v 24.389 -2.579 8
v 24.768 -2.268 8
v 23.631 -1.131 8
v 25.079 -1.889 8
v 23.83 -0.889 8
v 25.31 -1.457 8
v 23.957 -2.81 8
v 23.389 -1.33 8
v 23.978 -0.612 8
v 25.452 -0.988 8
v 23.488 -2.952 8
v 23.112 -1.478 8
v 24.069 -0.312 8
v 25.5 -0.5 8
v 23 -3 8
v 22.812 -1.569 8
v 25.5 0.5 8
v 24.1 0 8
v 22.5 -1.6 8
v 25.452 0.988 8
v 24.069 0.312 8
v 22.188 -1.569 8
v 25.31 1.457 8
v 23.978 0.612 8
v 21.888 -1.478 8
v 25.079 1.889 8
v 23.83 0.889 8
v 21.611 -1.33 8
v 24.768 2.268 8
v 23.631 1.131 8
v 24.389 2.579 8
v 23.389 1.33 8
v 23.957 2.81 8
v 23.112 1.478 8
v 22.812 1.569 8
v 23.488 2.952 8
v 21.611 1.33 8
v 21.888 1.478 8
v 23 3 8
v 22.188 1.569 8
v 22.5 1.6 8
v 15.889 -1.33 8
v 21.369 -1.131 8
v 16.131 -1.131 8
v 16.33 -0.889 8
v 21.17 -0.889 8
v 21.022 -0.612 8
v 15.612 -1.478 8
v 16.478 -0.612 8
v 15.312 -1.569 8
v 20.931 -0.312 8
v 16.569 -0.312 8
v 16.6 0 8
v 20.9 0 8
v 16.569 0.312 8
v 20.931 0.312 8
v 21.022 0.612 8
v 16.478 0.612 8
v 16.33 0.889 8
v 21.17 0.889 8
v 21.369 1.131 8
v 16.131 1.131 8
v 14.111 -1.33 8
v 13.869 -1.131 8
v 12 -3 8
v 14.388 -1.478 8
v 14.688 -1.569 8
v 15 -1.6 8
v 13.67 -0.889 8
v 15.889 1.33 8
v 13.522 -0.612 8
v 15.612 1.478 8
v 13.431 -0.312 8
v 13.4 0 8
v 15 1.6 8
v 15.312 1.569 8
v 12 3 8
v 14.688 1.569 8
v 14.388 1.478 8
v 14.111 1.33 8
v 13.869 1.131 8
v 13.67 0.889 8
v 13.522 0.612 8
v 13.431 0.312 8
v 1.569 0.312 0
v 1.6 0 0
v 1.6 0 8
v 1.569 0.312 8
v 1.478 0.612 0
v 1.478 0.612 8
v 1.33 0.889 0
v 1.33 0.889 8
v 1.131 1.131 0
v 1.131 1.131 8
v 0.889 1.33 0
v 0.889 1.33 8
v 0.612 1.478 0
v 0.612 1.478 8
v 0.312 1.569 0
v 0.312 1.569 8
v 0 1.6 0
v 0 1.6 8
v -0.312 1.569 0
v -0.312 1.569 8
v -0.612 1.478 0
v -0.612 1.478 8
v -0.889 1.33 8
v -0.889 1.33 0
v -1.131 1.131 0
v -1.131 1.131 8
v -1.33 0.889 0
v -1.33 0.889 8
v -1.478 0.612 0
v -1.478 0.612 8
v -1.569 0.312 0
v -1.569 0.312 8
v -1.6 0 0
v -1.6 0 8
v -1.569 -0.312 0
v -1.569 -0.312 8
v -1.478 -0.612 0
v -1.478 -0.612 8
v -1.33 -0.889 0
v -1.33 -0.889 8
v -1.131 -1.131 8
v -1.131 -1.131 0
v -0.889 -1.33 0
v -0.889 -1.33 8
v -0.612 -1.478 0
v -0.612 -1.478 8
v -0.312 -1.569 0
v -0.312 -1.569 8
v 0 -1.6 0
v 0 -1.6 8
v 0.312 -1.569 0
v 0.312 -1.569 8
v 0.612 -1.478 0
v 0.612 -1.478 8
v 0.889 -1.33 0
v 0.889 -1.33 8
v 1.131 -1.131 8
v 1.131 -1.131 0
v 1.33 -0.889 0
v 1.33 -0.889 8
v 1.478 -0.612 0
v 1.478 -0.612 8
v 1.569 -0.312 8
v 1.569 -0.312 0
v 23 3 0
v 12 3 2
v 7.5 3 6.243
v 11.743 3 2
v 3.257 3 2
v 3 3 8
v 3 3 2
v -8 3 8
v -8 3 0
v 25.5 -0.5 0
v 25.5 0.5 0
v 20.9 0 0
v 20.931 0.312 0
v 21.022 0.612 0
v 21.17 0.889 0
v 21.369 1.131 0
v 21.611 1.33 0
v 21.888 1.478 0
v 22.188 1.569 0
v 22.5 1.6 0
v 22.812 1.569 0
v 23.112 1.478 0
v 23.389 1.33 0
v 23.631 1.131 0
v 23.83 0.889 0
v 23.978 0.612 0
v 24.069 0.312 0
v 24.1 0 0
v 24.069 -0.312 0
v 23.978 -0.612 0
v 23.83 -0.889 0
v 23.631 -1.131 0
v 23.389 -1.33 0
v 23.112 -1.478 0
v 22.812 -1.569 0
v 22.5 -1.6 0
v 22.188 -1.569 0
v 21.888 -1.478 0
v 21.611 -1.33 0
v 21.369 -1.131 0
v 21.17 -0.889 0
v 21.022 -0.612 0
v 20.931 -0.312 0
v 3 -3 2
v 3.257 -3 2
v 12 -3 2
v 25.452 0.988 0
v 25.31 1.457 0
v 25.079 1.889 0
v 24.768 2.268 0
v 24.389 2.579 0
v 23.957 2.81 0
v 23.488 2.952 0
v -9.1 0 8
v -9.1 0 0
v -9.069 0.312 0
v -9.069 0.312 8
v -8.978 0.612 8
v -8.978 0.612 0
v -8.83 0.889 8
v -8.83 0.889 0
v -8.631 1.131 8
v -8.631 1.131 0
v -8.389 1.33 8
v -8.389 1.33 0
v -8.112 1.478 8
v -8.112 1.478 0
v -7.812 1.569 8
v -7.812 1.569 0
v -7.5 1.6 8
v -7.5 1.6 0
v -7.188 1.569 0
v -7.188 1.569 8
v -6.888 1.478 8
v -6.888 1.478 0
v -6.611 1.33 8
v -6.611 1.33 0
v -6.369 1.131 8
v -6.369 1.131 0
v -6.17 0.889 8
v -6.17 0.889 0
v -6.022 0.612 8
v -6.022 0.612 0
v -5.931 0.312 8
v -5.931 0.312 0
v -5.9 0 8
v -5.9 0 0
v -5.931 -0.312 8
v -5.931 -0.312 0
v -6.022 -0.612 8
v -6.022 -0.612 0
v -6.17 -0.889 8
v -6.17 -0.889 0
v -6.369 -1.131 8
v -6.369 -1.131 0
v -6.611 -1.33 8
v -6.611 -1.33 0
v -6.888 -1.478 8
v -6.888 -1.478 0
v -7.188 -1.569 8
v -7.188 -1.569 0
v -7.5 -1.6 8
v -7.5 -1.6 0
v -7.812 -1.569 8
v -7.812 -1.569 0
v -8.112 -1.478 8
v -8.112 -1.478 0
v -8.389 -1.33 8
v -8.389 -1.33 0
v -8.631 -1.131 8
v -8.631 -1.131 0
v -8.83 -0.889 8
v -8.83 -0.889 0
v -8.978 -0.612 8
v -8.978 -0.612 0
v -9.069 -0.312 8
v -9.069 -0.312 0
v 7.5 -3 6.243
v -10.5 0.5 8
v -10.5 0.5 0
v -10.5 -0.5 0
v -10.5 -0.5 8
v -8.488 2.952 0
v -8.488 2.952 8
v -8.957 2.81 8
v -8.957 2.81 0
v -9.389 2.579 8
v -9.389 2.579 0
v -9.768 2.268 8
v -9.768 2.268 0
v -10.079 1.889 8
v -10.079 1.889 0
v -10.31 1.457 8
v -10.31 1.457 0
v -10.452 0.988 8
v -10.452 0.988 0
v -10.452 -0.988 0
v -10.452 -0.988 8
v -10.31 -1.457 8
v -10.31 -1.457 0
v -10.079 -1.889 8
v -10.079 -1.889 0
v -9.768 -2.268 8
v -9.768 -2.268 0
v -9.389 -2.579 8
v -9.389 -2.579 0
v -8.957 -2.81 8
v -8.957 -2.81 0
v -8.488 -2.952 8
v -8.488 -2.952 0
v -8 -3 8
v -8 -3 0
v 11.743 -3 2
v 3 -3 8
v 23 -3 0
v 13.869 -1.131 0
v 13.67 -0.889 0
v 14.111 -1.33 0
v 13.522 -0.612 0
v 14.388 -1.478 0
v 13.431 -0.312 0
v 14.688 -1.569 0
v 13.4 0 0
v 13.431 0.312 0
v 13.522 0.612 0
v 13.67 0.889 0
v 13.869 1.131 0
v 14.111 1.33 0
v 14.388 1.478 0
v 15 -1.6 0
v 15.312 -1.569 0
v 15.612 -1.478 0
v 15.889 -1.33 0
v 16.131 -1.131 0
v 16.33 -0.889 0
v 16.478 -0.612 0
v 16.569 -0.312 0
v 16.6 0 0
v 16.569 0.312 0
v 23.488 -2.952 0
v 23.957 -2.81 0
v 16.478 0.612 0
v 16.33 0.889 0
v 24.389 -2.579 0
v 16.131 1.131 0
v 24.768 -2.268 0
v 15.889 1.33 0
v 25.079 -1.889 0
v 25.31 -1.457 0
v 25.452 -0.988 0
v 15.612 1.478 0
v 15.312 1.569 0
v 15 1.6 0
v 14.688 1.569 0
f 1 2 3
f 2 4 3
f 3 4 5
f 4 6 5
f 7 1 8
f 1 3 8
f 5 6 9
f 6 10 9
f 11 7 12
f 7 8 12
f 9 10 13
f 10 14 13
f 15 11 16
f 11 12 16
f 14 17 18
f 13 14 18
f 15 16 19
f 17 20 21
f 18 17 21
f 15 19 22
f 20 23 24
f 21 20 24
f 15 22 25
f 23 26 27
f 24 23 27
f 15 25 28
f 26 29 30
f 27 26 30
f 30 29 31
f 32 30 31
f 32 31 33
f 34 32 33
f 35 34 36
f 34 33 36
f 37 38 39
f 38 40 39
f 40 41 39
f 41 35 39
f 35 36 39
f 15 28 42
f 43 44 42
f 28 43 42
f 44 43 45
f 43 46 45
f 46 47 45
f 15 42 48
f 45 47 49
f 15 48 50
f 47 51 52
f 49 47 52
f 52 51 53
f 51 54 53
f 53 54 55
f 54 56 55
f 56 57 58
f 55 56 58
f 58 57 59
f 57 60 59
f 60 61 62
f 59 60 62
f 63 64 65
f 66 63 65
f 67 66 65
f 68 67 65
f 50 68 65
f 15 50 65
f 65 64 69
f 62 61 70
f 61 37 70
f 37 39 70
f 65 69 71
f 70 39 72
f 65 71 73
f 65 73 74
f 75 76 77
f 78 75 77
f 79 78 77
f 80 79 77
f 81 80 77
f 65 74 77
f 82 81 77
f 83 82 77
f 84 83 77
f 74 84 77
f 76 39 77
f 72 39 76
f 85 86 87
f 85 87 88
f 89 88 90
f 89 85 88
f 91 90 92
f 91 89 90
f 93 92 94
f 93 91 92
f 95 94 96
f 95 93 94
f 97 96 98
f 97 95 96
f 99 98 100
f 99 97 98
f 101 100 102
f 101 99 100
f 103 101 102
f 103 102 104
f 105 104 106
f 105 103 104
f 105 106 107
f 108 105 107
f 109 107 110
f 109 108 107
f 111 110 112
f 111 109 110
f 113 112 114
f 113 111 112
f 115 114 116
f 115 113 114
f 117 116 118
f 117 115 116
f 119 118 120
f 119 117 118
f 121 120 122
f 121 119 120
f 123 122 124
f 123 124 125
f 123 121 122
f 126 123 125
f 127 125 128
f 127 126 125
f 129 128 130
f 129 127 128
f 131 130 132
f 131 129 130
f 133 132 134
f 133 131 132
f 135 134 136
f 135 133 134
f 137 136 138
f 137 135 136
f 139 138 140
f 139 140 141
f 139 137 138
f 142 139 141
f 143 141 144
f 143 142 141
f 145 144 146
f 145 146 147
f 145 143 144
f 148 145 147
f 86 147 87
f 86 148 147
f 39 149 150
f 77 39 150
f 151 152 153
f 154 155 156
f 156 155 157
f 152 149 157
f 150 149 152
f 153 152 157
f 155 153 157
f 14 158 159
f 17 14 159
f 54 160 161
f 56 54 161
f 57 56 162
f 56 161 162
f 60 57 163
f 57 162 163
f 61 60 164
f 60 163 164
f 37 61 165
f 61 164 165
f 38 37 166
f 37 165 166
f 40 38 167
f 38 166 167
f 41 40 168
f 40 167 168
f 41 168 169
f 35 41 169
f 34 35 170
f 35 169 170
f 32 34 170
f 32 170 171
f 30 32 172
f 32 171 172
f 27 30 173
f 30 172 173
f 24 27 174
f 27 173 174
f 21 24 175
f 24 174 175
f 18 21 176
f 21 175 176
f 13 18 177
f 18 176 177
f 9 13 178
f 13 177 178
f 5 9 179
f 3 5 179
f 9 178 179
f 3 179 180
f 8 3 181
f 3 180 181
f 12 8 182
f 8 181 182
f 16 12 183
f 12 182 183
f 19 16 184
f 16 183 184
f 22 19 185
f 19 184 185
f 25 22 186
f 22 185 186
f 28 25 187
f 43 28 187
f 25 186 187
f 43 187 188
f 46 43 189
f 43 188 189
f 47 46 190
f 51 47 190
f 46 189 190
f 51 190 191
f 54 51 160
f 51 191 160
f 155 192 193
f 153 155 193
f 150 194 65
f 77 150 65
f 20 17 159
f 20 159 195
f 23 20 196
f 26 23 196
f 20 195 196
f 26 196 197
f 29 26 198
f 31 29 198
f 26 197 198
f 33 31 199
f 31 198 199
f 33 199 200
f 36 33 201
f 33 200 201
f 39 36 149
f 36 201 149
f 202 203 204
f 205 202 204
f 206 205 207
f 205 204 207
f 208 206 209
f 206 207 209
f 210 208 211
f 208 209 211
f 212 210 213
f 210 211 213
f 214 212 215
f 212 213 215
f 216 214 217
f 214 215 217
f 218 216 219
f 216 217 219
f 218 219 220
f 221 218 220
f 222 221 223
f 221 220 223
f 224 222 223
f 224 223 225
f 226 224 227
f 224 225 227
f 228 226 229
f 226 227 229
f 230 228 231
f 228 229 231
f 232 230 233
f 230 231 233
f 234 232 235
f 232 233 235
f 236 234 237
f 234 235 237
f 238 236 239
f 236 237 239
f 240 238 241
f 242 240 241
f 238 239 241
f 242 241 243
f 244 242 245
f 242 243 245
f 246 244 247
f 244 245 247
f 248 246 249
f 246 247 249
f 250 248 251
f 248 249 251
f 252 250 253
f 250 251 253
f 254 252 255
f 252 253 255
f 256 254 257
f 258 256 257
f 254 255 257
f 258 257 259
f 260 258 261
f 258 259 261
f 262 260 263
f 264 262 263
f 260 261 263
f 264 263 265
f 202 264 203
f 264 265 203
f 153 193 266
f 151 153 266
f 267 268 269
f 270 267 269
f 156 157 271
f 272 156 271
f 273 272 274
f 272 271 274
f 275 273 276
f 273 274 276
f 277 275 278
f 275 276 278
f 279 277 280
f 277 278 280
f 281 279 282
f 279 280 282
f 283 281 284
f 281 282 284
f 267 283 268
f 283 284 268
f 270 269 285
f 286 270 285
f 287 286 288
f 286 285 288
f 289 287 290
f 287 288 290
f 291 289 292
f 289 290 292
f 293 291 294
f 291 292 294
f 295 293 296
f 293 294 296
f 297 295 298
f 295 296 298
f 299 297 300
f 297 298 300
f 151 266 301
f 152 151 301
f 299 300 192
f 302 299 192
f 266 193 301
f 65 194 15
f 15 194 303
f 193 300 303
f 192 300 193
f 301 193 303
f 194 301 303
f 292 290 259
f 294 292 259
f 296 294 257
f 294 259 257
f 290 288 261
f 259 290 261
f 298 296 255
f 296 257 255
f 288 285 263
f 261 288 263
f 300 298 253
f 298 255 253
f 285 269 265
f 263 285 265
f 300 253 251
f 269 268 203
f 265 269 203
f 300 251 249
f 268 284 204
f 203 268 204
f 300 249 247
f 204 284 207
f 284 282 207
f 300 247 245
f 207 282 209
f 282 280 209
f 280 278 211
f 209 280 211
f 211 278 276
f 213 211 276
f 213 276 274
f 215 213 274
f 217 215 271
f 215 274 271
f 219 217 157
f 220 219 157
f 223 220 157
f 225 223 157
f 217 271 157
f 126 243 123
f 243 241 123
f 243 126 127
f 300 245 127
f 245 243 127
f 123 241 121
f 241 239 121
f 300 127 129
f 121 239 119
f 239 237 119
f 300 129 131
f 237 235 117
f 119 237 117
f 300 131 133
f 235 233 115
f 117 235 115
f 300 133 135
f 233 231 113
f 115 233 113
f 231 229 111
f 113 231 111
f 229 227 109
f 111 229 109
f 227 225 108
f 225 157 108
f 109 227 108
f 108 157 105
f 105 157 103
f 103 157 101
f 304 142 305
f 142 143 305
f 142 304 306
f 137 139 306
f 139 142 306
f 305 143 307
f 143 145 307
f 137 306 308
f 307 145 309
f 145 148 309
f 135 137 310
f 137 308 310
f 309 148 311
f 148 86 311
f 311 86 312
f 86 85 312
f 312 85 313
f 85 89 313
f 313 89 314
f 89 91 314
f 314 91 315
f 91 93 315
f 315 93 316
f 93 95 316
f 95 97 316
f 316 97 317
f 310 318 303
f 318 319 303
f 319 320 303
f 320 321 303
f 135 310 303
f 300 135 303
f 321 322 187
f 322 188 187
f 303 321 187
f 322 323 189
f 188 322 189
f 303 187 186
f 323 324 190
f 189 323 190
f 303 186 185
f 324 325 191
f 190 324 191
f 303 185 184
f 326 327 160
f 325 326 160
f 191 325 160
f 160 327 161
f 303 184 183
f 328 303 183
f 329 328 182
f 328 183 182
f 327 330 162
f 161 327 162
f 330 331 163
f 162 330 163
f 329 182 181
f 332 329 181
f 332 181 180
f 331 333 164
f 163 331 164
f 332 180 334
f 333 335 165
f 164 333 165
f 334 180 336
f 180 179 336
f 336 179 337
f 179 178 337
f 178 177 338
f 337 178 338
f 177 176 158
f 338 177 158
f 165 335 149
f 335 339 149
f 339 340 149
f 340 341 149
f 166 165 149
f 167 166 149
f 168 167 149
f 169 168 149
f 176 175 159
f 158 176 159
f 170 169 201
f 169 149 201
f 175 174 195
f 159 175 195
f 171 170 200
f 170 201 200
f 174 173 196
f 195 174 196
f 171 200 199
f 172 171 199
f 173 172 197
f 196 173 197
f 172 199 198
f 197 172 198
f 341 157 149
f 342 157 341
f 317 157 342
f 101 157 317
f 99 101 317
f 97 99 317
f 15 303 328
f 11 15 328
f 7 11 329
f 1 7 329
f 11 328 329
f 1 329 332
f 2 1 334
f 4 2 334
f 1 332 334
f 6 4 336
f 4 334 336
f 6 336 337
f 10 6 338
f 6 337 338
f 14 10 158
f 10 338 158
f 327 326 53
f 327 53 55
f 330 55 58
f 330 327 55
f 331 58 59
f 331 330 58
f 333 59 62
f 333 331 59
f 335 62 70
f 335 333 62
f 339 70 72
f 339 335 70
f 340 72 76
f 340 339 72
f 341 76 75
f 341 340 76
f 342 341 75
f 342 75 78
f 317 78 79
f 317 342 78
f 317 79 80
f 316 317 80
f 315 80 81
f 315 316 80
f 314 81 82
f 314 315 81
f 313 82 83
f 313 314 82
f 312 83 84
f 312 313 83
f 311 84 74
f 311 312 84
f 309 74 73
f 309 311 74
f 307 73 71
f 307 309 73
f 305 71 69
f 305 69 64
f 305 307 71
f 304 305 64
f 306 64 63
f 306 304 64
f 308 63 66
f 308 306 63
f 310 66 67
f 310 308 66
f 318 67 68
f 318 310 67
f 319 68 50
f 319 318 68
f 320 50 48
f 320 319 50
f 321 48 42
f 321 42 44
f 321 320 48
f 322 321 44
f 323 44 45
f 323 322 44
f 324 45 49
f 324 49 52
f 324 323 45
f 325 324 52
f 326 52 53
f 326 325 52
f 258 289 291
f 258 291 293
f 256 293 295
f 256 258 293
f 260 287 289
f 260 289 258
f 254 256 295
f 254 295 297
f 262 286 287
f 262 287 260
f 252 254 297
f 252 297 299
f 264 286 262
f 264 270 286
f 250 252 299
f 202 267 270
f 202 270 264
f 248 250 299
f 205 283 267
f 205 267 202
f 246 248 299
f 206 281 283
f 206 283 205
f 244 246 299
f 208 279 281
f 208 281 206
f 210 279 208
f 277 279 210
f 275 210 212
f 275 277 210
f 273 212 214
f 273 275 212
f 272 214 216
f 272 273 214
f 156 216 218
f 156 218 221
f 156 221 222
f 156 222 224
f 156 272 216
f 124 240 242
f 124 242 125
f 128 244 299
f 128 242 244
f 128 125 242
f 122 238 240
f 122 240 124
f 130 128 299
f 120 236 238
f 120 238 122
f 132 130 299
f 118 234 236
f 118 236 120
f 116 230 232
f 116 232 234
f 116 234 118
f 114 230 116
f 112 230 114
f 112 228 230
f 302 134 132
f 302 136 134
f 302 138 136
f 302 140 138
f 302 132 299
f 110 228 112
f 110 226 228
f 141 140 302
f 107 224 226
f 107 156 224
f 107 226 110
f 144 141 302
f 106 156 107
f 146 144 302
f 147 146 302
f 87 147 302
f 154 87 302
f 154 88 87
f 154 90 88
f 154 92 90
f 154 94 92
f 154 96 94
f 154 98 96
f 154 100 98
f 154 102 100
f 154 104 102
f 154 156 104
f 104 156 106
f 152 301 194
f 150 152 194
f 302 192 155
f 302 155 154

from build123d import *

# Parameters (mm, degrees)
SKETCH1_R           = 1.6
BOSS_EXTRUDE1_DEPTH = 8
SKETCH2_W           = 9
SKETCH2_H           = 8.199711987
CUT_EXTRUDE1_DEPTH  = 8
BOSS_EXTRUDE2_DEPTH = 6
SKETCH4_R           = 1.6
BOSS_EXTRUDE3_DEPTH = 8


with BuildPart() as part:
    # Sketch1 → Boss-Extrude1 (new body)
    with BuildSketch(Plane.XY):
        with BuildLine():
            Line((-0.5, 3), (15.5, 3))
            ThreePointArc((15.5, 3), (17.267766953, 2.267766953), (18, 0.5))
            Line((18, 0.5), (18, -0.5))
            ThreePointArc((18, -0.5), (17.267766953, -2.267766953), (15.5, -3))
            Line((15.5, -3), (-0.5, -3))
            ThreePointArc((-0.5, -3), (-2.267766953, -2.267766953), (-3, -0.5))
            Line((-3, -0.5), (-3, 0.5))
            ThreePointArc((-3, 0.5), (-2.267766953, 2.267766953), (-0.5, 3))
        make_face()
        Circle(SKETCH1_R, mode=Mode.SUBTRACT)
        with Locations((15, 0)):
            Circle(SKETCH1_R, mode=Mode.SUBTRACT)
    extrude(amount=BOSS_EXTRUDE1_DEPTH)

    # Sketch2 → Cut-Extrude1 (cut)
    with BuildSketch(Plane.XZ.offset(3)):
        with Locations((7.5, 6.099855994)):
            Rectangle(SKETCH2_W, SKETCH2_H)
    extrude(amount=-CUT_EXTRUDE1_DEPTH, mode=Mode.SUBTRACT)

    # Sketch3 → Boss-Extrude2 (add)
    with BuildSketch(Plane.XZ.offset(3)):
        Polygon((3.257359313, 2), (7.5, 6.242640687), (11.742640687, 2), align=None)
    extrude(amount=-BOSS_EXTRUDE2_DEPTH)

    # Sketch4 → Boss-Extrude3 (add)
    with BuildSketch(Plane(origin=(0, 0, 0), x_dir=(-1, 0, 0), z_dir=(0, 0, -1))):
        with BuildLine():
            ThreePointArc((8, 3), (9.767766953, 2.267766953), (10.5, 0.5))
            Line((10.5, 0.5), (10.5, -0.5))
            ThreePointArc((10.5, -0.5), (9.767766953, -2.267766953), (8, -3))
            Line((8, -3), (0.5, -3))
            ThreePointArc((0.5, -3), (2.267766953, -2.267766953), (3, -0.5))
            Line((3, -0.5), (3, 0.5))
            ThreePointArc((3, 0.5), (2.267766953, 2.267766953), (0.5, 3))
            Line((0.5, 3), (8, 3))
        make_face()
        with Locations((7.5, 0)):
            Circle(SKETCH4_R, mode=Mode.SUBTRACT)
        with BuildLine():
            ThreePointArc((-23, -3), (-24.767766953, -2.267766953), (-25.5, -0.5))
            Line((-25.5, -0.5), (-25.5, 0.5))
            ThreePointArc((-25.5, 0.5), (-24.767766953, 2.267766953), (-23, 3))
            Line((-23, 3), (-15.5, 3))
            ThreePointArc((-15.5, 3), (-17.267766953, 2.267766953), (-18, 0.5))
            Line((-18, 0.5), (-18, -0.5))
            ThreePointArc((-18, -0.5), (-17.267766953, -2.267766953), (-15.5, -3))
            Line((-15.5, -3), (-23, -3))
        make_face()
        with Locations((-22.5, 0)):
            Circle(SKETCH4_R, mode=Mode.SUBTRACT)
    extrude(amount=-BOSS_EXTRUDE3_DEPTH)


solid = part.part
